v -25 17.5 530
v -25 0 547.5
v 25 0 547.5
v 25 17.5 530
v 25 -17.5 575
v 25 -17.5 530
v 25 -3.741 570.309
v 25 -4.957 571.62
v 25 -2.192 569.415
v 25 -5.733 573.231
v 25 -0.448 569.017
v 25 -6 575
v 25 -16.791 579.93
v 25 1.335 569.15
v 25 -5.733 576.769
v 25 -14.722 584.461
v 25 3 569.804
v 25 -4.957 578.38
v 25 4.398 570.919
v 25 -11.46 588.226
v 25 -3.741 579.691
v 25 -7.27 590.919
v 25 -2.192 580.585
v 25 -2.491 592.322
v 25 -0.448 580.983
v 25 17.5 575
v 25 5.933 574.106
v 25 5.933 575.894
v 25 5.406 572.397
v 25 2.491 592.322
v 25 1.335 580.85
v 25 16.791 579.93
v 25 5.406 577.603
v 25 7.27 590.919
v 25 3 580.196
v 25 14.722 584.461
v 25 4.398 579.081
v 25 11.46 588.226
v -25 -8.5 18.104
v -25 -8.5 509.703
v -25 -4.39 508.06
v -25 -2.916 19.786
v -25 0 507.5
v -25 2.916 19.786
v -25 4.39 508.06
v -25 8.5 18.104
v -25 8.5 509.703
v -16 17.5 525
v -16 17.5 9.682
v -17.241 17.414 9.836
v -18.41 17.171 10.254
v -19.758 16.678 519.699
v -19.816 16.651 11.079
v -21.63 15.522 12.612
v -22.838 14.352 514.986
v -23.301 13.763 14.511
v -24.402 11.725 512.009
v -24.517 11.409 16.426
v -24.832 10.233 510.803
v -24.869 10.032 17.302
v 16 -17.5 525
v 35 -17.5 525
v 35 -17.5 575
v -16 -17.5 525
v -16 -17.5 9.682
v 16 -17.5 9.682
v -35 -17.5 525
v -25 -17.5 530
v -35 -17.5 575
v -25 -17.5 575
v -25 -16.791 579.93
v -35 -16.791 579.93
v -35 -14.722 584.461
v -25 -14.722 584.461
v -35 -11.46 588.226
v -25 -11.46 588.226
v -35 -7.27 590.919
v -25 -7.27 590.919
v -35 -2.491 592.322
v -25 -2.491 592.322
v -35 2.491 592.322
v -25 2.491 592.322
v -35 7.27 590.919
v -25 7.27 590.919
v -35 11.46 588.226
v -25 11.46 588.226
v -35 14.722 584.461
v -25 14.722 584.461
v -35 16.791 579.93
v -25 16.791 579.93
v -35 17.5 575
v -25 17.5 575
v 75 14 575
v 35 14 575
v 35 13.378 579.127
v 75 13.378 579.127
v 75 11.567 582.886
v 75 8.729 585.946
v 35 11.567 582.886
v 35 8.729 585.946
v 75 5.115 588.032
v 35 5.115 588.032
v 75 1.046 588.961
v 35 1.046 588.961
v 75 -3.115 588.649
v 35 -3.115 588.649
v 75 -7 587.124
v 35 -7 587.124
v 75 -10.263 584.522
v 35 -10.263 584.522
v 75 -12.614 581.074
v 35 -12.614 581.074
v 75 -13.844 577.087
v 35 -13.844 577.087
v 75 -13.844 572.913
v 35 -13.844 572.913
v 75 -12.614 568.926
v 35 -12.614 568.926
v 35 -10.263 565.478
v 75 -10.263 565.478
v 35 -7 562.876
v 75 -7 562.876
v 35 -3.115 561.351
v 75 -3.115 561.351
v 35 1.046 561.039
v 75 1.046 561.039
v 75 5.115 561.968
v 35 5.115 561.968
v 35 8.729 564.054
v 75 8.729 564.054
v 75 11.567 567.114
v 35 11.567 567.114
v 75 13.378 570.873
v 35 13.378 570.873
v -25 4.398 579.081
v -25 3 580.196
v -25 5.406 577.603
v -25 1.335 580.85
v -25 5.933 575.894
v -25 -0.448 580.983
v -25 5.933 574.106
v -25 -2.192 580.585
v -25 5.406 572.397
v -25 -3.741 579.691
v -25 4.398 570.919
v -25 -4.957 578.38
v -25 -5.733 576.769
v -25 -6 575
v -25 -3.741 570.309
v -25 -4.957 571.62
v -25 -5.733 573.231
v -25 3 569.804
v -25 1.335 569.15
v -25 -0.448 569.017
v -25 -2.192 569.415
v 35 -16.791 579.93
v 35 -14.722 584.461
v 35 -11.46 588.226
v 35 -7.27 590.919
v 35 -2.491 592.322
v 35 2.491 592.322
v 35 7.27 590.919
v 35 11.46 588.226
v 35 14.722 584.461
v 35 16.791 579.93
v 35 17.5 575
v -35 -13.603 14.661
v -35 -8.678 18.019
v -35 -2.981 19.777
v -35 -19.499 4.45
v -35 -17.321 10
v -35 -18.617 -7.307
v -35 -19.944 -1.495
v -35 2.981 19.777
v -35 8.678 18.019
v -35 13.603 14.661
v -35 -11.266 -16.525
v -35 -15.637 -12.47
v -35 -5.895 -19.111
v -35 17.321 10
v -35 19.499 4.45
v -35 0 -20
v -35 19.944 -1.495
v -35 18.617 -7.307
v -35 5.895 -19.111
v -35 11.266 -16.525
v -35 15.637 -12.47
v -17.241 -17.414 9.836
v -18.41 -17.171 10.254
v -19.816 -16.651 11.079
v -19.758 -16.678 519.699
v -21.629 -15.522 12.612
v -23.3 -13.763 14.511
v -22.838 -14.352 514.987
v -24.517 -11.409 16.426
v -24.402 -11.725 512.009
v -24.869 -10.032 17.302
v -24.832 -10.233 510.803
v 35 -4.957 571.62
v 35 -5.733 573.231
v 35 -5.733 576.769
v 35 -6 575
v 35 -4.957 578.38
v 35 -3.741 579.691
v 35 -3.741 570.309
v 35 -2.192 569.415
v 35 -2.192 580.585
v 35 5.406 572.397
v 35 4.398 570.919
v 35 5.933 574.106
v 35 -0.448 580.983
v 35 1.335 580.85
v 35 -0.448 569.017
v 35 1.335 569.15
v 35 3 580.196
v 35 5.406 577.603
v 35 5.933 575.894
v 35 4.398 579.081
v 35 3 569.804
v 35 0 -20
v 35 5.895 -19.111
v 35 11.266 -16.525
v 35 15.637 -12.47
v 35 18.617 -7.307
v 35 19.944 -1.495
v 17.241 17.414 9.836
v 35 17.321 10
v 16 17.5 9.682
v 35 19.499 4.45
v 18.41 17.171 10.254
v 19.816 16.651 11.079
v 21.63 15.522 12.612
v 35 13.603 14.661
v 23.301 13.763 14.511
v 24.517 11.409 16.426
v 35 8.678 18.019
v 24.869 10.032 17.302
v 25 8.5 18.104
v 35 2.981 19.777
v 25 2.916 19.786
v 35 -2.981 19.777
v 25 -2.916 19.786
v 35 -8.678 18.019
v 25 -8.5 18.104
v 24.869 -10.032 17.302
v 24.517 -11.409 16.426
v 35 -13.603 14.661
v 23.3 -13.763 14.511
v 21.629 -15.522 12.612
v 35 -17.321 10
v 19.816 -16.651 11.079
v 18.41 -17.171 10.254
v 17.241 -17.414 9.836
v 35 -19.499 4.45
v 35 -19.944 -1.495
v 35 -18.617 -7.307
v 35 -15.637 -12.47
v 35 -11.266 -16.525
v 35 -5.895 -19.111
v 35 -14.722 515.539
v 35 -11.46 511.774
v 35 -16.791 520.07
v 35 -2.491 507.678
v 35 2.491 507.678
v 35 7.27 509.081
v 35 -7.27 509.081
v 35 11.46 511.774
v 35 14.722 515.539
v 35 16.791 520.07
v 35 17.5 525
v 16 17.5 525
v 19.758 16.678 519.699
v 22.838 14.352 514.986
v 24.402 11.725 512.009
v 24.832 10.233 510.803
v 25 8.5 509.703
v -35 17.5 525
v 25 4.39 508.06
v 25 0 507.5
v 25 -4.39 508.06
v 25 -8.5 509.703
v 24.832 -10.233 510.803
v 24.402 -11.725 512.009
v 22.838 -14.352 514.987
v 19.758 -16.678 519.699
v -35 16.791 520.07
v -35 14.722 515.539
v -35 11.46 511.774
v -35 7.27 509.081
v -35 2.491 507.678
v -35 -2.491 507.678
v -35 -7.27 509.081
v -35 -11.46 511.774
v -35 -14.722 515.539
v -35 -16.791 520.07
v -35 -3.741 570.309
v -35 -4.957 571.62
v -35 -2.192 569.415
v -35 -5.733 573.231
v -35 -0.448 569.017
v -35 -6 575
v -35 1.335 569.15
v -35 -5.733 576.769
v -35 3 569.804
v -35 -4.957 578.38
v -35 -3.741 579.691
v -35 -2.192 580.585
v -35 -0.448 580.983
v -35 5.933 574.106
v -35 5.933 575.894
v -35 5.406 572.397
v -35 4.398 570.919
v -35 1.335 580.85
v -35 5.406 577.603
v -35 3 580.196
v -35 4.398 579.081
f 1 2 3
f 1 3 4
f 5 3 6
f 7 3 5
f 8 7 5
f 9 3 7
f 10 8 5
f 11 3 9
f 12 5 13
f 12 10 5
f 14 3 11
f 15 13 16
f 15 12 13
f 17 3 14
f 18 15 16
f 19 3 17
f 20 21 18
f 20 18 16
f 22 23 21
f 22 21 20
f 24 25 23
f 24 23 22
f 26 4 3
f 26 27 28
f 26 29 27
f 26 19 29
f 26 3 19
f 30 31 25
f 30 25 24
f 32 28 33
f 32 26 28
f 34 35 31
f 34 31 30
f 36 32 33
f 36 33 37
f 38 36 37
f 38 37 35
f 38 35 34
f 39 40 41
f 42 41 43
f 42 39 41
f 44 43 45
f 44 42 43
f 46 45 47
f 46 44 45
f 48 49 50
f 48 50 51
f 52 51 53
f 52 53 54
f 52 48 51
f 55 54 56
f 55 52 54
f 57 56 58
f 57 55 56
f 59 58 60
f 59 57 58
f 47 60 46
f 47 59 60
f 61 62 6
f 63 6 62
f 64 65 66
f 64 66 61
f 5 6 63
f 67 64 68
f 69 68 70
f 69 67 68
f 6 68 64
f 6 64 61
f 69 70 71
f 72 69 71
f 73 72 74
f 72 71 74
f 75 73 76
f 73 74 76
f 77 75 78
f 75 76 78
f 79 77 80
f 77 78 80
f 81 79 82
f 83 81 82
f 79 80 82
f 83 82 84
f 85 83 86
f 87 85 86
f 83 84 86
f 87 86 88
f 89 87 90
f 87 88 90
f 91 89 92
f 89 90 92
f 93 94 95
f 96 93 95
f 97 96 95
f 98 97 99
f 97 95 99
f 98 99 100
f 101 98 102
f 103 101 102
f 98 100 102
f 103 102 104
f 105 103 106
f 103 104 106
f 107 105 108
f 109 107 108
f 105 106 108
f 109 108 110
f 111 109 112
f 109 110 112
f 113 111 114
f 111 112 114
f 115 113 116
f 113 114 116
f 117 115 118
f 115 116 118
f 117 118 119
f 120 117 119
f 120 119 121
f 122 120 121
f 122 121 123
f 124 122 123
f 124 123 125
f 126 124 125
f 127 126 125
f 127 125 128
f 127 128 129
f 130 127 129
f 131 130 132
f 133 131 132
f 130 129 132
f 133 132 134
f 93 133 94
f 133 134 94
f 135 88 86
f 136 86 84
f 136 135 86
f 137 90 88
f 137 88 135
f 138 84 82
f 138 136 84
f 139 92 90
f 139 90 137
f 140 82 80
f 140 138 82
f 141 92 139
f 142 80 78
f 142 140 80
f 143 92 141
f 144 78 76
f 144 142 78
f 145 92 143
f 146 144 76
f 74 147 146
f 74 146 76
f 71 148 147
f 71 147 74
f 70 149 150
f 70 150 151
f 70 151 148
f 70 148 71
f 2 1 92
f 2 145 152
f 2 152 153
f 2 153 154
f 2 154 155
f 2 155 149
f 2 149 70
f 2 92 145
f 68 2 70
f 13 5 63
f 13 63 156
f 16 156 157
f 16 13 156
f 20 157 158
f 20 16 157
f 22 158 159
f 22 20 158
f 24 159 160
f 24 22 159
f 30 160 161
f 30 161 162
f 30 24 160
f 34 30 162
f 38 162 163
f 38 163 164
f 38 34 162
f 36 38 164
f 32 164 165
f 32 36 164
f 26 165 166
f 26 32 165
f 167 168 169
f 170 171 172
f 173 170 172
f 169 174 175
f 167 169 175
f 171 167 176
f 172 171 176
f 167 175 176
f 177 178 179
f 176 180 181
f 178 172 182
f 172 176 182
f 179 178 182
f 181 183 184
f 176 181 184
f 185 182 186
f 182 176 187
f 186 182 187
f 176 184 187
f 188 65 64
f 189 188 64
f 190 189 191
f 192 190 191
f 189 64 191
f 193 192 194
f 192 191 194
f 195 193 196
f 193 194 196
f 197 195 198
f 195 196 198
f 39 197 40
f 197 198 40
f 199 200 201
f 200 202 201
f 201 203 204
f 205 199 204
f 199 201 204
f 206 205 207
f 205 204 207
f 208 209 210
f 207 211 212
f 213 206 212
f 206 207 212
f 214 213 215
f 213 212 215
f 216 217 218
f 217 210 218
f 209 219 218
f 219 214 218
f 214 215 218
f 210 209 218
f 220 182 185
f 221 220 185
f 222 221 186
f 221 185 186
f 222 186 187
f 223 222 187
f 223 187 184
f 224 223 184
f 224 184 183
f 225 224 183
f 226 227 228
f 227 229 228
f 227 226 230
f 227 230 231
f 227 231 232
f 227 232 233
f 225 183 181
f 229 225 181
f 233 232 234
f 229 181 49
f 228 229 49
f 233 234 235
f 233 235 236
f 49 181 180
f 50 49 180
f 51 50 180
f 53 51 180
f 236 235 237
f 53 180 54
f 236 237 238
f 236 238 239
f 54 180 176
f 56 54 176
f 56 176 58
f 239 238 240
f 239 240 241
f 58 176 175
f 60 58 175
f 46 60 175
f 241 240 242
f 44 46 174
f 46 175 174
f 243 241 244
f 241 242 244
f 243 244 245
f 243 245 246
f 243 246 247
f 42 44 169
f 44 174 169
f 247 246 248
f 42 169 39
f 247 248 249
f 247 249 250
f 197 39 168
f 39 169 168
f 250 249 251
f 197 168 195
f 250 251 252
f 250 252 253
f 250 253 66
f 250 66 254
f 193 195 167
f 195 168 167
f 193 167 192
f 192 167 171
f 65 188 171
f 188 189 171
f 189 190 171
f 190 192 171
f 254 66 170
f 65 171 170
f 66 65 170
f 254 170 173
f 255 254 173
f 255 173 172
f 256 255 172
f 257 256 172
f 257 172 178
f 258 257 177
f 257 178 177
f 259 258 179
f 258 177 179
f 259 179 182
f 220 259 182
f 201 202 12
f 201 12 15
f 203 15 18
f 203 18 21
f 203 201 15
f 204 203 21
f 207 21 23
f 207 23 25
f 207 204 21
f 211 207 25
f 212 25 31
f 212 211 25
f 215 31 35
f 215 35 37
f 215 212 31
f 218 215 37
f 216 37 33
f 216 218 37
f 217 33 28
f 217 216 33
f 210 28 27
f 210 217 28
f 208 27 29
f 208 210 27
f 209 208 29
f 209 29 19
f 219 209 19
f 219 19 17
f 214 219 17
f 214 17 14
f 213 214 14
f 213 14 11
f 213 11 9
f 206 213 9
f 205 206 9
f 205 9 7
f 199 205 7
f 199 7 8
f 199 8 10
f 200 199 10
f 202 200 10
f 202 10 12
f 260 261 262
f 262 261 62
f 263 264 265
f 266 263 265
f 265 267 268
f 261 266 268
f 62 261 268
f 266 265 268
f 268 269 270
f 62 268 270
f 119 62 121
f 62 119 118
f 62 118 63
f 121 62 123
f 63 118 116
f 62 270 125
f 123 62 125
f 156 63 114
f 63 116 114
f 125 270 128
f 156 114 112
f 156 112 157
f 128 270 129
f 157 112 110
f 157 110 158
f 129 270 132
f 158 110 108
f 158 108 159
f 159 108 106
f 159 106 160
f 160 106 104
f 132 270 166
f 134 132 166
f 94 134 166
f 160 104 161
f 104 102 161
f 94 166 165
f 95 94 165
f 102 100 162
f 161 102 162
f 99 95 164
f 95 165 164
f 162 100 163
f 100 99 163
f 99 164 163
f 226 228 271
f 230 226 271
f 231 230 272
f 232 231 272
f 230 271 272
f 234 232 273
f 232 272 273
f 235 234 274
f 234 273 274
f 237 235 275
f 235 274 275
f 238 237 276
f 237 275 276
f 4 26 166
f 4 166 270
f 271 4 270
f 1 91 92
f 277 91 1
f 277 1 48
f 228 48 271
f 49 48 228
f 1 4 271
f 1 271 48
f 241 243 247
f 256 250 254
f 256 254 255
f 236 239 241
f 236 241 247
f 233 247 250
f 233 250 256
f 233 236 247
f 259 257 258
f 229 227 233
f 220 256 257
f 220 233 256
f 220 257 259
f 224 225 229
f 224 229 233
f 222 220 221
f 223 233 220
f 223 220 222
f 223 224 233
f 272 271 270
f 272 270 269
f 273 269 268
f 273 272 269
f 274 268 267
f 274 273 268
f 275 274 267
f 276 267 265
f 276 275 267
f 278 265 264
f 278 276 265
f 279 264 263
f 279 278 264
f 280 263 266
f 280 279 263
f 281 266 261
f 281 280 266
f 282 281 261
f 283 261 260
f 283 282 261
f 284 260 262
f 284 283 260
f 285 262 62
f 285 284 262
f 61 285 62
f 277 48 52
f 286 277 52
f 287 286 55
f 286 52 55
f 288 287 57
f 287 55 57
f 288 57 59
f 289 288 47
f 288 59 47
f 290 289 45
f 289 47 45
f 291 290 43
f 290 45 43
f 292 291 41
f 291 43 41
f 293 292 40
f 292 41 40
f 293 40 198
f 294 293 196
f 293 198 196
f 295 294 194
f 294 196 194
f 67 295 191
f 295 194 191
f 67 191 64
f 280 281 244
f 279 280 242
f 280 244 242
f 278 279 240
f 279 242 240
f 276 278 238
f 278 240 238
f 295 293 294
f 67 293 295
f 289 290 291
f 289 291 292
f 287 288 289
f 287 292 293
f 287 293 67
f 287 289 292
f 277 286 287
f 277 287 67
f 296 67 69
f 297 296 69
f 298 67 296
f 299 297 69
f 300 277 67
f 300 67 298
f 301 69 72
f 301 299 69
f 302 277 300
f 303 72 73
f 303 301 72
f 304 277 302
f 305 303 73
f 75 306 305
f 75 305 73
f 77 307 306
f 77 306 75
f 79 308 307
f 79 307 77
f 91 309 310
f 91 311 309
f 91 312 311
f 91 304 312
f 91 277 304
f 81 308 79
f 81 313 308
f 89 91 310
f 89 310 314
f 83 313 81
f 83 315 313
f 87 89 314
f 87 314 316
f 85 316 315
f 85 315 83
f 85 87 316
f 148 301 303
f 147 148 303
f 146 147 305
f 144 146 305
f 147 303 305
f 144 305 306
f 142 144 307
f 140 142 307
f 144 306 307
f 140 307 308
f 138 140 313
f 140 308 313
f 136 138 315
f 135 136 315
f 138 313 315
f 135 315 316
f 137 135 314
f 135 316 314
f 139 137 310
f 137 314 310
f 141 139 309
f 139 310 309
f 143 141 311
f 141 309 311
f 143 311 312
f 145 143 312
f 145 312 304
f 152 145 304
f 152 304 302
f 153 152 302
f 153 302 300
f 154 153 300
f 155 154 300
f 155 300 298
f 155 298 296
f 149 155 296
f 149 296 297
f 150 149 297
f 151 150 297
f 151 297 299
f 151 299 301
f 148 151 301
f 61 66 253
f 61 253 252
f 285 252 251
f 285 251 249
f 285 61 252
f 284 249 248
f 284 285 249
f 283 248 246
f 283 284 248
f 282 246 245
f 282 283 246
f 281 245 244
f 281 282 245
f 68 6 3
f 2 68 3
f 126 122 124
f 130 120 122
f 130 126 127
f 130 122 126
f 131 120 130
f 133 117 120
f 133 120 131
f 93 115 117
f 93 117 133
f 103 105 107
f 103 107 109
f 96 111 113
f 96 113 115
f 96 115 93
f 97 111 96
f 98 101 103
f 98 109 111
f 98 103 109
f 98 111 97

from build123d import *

# Parameters (mm, degrees)
AUFSATZ_LINEAR_AUSTRAGEN1_DEPTH      = 35
AUFSATZ_LINEAR_AUSTRAGEN1_DEPTH_BACK = 35
SKIZZE1_R                            = 20
SKIZZE2_W                            = 50
SKIZZE2_H                            = 35
AUFSATZ_LINEAR_AUSTRAGEN2_DEPTH      = 550
AUFSATZ_LINEAR_AUSTRAGEN3_DEPTH      = 10
SCHNITT_LINEAR_AUSTRAGEN1_REACH      = 598.956
SKIZZE4_R                            = 6
SKIZZE5_R                            = 14
AUFSATZ_LINEAR_AUSTRAGEN4_DEPTH      = 40
VERRUNDUNG1_R                        = 9
FASE2_SIZE                           = 20


with BuildPart() as part:
    # Skizze1 → Aufsatz-Linear austragen1 (new, two sides: drawn at the far end of the back side and taken through both)
    with BuildSketch(Plane(origin=(0, 0, 0), x_dir=(0, 0, -1), z_dir=(1, 0, 0)).offset(-AUFSATZ_LINEAR_AUSTRAGEN1_DEPTH_BACK)):
        Circle(SKIZZE1_R)
    extrude(amount=AUFSATZ_LINEAR_AUSTRAGEN1_DEPTH + AUFSATZ_LINEAR_AUSTRAGEN1_DEPTH_BACK)

    # Skizze2 → Aufsatz-Linear austragen2 (add)
    with BuildSketch(Plane.XY):
        Rectangle(SKIZZE2_W, SKIZZE2_H)
    extrude(amount=AUFSATZ_LINEAR_AUSTRAGEN2_DEPTH)

    # Skizze3 → Aufsatz-Linear austragen3 (add)
    with BuildSketch(Plane.ZY.offset(25)):
        with BuildLine():
            Line((550, 17.5), (525, 17.5))
            ThreePointArc((525, 17.5), (507.5, 0), (525, -17.5))
            Line((525, -17.5), (550, -17.5))
            Line((550, -17.5), (575, -17.5))
            ThreePointArc((575, -17.5), (592.5, 0), (575, 17.5))
            Line((575, 17.5), (550, 17.5))
        make_face()
    aufsatz_linear_austragen3 = extrude(amount=AUFSATZ_LINEAR_AUSTRAGEN3_DEPTH)

    # Skizze4 → Schnitt-Linear austragen1 (cut, up to next)
    with BuildSketch(Plane.ZY.offset(35), mode=Mode.PRIVATE) as schnitt_linear_austragen1_sk1:
        with Locations(Location((575, 0, 0), (0, 0, 270))):
            Circle(SKIZZE4_R)
    schnitt_linear_austragen1_tool1 = extrude(schnitt_linear_austragen1_sk1.sketch, amount=-SCHNITT_LINEAR_AUSTRAGEN1_REACH, mode=Mode.PRIVATE) & part.part
    schnitt_linear_austragen1 = schnitt_linear_austragen1_tool1.solids().sort_by_distance((-35, 0, 575))[0]
    add(schnitt_linear_austragen1, mode=Mode.SUBTRACT)

    # Spiegeln1: Aufsatz-Linear austragen3, Schnitt-Linear austragen1 across plane
    add(aufsatz_linear_austragen3.mirror(Plane(origin=(0, 0, 0), x_dir=(0, 0, 1), z_dir=(1, 0, 0))))
    add(schnitt_linear_austragen1.mirror(Plane(origin=(0, 0, 0), x_dir=(0, 0, 1), z_dir=(1, 0, 0))), mode=Mode.SUBTRACT)

    # Skizze5 → Aufsatz-Linear austragen4 (add)
    with BuildSketch(Plane(origin=(35, 0, 0), x_dir=(0, 0, -1), z_dir=(1, 0, 0))):
        with Locations(Location((-575, 0, 0), (0, 0, 90))):
            Circle(SKIZZE5_R)
    extrude(amount=AUFSATZ_LINEAR_AUSTRAGEN4_DEPTH)

    # Verrundung1
    verrundung1_edges = [part.edges().sort_by_distance(p)[0] for p in [
        (-25, 17.5, 267.341229183),
        (-25, -17.5, 267.341229183),
        (25, 17.5, 267.341229183),
        (25, -17.5, 267.341229183),
    ]]
    fillet(verrundung1_edges, radius=VERRUNDUNG1_R)

    # Fase2
    # the kernel refuses this chamfer: 20 mm, written as the material it takes off along each edge
    with BuildSketch(Plane(origin=(25, -17.5, 550), x_dir=(0, -0.027495876610586282, -0.9996219169112968), z_dir=(-1, 0, 0))) as fase2_piece_1:
        Polygon((FASE2_SIZE * 0.999621916911, -FASE2_SIZE * 0.0274958766106), (-FASE2_SIZE * 0.0274958766106, -FASE2_SIZE * 0.999621916911), (0, 0), align=None)
    extrude(amount=50, mode=Mode.SUBTRACT)
    with BuildSketch(Plane(origin=(-25, 17.5, 550), x_dir=(0, -0.9996219169112968, 0.0274958766105877), z_dir=(1, 0, 0))) as fase2_piece_2:
        Polygon((FASE2_SIZE * 0.999621916911, FASE2_SIZE * 0.0274958766106), (-FASE2_SIZE * 0.0274958766106, FASE2_SIZE * 0.999621916911), (0, 0), align=None)
    extrude(amount=50, mode=Mode.SUBTRACT)


solid = part.part
